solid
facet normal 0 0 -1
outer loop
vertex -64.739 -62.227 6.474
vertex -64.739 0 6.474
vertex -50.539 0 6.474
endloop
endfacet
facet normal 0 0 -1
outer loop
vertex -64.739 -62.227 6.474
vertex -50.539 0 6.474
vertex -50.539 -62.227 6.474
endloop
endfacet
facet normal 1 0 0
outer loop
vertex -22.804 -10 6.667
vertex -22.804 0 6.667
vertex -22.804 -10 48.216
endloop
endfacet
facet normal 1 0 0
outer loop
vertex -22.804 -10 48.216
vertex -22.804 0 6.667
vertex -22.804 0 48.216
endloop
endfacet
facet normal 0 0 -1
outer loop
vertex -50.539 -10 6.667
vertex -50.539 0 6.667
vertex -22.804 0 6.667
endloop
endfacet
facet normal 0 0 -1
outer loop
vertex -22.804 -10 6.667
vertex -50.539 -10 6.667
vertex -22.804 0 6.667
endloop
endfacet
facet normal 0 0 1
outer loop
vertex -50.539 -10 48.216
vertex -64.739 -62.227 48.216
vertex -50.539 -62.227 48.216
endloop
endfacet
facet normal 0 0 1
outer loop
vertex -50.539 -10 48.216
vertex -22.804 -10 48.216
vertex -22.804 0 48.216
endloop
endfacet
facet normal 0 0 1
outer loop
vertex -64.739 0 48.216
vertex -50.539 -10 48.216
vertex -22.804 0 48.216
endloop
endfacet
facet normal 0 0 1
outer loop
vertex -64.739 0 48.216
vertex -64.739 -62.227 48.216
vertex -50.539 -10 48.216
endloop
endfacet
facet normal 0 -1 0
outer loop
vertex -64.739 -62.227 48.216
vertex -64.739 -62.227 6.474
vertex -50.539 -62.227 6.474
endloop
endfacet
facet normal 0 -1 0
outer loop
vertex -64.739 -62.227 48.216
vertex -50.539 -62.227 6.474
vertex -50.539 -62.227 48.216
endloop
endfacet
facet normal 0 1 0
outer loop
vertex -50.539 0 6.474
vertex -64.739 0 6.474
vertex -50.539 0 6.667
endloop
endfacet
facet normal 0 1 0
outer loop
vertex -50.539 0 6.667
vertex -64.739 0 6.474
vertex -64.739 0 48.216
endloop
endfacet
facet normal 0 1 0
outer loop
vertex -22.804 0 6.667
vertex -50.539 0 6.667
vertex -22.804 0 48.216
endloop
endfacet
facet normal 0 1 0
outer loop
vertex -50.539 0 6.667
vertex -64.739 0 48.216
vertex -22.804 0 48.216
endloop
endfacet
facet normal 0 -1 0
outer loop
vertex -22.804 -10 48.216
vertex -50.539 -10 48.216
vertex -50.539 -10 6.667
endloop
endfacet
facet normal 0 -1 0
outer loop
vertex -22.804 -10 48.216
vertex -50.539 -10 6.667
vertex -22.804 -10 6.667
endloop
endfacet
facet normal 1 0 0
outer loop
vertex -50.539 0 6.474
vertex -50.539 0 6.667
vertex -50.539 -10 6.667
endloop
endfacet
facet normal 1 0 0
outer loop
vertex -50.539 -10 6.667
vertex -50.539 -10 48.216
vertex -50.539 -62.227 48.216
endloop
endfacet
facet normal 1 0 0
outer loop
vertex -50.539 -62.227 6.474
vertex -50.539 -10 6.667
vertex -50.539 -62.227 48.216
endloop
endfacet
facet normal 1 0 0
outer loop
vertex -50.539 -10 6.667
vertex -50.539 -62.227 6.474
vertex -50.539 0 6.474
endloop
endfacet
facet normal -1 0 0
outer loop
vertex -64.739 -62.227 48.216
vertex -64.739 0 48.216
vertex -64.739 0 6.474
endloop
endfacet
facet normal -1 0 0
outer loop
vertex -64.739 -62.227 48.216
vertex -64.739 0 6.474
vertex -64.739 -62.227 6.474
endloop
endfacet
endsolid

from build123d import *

# Parameters (mm, degrees)
F0_W     = 41.935582
F0_H     = 41.549082
F1_DEPTH = 10
F3_DEPTH = 14.2


with BuildPart() as f1:
    # F0 (on Front) → F1 (new body)
    with BuildSketch(Plane.XZ):
        with Locations((-43.771474, 27.44172)):
            Rectangle(F0_W, F0_H)
    extrude(amount=F1_DEPTH)

    # F2 (on face) → F3 (join)
    with BuildSketch(Plane(origin=(-64.739265, 0, 0), x_dir=(0, -1, 0), z_dir=(-1, 0, 0))):
        Polygon((62.226996, 48.216261), (10, 48.216261), (10, 6.667179), (0, 6.667179), (0, 6.473927), (62.226996, 6.473927), align=None)
    extrude(amount=-F3_DEPTH)


solid = f1.part
